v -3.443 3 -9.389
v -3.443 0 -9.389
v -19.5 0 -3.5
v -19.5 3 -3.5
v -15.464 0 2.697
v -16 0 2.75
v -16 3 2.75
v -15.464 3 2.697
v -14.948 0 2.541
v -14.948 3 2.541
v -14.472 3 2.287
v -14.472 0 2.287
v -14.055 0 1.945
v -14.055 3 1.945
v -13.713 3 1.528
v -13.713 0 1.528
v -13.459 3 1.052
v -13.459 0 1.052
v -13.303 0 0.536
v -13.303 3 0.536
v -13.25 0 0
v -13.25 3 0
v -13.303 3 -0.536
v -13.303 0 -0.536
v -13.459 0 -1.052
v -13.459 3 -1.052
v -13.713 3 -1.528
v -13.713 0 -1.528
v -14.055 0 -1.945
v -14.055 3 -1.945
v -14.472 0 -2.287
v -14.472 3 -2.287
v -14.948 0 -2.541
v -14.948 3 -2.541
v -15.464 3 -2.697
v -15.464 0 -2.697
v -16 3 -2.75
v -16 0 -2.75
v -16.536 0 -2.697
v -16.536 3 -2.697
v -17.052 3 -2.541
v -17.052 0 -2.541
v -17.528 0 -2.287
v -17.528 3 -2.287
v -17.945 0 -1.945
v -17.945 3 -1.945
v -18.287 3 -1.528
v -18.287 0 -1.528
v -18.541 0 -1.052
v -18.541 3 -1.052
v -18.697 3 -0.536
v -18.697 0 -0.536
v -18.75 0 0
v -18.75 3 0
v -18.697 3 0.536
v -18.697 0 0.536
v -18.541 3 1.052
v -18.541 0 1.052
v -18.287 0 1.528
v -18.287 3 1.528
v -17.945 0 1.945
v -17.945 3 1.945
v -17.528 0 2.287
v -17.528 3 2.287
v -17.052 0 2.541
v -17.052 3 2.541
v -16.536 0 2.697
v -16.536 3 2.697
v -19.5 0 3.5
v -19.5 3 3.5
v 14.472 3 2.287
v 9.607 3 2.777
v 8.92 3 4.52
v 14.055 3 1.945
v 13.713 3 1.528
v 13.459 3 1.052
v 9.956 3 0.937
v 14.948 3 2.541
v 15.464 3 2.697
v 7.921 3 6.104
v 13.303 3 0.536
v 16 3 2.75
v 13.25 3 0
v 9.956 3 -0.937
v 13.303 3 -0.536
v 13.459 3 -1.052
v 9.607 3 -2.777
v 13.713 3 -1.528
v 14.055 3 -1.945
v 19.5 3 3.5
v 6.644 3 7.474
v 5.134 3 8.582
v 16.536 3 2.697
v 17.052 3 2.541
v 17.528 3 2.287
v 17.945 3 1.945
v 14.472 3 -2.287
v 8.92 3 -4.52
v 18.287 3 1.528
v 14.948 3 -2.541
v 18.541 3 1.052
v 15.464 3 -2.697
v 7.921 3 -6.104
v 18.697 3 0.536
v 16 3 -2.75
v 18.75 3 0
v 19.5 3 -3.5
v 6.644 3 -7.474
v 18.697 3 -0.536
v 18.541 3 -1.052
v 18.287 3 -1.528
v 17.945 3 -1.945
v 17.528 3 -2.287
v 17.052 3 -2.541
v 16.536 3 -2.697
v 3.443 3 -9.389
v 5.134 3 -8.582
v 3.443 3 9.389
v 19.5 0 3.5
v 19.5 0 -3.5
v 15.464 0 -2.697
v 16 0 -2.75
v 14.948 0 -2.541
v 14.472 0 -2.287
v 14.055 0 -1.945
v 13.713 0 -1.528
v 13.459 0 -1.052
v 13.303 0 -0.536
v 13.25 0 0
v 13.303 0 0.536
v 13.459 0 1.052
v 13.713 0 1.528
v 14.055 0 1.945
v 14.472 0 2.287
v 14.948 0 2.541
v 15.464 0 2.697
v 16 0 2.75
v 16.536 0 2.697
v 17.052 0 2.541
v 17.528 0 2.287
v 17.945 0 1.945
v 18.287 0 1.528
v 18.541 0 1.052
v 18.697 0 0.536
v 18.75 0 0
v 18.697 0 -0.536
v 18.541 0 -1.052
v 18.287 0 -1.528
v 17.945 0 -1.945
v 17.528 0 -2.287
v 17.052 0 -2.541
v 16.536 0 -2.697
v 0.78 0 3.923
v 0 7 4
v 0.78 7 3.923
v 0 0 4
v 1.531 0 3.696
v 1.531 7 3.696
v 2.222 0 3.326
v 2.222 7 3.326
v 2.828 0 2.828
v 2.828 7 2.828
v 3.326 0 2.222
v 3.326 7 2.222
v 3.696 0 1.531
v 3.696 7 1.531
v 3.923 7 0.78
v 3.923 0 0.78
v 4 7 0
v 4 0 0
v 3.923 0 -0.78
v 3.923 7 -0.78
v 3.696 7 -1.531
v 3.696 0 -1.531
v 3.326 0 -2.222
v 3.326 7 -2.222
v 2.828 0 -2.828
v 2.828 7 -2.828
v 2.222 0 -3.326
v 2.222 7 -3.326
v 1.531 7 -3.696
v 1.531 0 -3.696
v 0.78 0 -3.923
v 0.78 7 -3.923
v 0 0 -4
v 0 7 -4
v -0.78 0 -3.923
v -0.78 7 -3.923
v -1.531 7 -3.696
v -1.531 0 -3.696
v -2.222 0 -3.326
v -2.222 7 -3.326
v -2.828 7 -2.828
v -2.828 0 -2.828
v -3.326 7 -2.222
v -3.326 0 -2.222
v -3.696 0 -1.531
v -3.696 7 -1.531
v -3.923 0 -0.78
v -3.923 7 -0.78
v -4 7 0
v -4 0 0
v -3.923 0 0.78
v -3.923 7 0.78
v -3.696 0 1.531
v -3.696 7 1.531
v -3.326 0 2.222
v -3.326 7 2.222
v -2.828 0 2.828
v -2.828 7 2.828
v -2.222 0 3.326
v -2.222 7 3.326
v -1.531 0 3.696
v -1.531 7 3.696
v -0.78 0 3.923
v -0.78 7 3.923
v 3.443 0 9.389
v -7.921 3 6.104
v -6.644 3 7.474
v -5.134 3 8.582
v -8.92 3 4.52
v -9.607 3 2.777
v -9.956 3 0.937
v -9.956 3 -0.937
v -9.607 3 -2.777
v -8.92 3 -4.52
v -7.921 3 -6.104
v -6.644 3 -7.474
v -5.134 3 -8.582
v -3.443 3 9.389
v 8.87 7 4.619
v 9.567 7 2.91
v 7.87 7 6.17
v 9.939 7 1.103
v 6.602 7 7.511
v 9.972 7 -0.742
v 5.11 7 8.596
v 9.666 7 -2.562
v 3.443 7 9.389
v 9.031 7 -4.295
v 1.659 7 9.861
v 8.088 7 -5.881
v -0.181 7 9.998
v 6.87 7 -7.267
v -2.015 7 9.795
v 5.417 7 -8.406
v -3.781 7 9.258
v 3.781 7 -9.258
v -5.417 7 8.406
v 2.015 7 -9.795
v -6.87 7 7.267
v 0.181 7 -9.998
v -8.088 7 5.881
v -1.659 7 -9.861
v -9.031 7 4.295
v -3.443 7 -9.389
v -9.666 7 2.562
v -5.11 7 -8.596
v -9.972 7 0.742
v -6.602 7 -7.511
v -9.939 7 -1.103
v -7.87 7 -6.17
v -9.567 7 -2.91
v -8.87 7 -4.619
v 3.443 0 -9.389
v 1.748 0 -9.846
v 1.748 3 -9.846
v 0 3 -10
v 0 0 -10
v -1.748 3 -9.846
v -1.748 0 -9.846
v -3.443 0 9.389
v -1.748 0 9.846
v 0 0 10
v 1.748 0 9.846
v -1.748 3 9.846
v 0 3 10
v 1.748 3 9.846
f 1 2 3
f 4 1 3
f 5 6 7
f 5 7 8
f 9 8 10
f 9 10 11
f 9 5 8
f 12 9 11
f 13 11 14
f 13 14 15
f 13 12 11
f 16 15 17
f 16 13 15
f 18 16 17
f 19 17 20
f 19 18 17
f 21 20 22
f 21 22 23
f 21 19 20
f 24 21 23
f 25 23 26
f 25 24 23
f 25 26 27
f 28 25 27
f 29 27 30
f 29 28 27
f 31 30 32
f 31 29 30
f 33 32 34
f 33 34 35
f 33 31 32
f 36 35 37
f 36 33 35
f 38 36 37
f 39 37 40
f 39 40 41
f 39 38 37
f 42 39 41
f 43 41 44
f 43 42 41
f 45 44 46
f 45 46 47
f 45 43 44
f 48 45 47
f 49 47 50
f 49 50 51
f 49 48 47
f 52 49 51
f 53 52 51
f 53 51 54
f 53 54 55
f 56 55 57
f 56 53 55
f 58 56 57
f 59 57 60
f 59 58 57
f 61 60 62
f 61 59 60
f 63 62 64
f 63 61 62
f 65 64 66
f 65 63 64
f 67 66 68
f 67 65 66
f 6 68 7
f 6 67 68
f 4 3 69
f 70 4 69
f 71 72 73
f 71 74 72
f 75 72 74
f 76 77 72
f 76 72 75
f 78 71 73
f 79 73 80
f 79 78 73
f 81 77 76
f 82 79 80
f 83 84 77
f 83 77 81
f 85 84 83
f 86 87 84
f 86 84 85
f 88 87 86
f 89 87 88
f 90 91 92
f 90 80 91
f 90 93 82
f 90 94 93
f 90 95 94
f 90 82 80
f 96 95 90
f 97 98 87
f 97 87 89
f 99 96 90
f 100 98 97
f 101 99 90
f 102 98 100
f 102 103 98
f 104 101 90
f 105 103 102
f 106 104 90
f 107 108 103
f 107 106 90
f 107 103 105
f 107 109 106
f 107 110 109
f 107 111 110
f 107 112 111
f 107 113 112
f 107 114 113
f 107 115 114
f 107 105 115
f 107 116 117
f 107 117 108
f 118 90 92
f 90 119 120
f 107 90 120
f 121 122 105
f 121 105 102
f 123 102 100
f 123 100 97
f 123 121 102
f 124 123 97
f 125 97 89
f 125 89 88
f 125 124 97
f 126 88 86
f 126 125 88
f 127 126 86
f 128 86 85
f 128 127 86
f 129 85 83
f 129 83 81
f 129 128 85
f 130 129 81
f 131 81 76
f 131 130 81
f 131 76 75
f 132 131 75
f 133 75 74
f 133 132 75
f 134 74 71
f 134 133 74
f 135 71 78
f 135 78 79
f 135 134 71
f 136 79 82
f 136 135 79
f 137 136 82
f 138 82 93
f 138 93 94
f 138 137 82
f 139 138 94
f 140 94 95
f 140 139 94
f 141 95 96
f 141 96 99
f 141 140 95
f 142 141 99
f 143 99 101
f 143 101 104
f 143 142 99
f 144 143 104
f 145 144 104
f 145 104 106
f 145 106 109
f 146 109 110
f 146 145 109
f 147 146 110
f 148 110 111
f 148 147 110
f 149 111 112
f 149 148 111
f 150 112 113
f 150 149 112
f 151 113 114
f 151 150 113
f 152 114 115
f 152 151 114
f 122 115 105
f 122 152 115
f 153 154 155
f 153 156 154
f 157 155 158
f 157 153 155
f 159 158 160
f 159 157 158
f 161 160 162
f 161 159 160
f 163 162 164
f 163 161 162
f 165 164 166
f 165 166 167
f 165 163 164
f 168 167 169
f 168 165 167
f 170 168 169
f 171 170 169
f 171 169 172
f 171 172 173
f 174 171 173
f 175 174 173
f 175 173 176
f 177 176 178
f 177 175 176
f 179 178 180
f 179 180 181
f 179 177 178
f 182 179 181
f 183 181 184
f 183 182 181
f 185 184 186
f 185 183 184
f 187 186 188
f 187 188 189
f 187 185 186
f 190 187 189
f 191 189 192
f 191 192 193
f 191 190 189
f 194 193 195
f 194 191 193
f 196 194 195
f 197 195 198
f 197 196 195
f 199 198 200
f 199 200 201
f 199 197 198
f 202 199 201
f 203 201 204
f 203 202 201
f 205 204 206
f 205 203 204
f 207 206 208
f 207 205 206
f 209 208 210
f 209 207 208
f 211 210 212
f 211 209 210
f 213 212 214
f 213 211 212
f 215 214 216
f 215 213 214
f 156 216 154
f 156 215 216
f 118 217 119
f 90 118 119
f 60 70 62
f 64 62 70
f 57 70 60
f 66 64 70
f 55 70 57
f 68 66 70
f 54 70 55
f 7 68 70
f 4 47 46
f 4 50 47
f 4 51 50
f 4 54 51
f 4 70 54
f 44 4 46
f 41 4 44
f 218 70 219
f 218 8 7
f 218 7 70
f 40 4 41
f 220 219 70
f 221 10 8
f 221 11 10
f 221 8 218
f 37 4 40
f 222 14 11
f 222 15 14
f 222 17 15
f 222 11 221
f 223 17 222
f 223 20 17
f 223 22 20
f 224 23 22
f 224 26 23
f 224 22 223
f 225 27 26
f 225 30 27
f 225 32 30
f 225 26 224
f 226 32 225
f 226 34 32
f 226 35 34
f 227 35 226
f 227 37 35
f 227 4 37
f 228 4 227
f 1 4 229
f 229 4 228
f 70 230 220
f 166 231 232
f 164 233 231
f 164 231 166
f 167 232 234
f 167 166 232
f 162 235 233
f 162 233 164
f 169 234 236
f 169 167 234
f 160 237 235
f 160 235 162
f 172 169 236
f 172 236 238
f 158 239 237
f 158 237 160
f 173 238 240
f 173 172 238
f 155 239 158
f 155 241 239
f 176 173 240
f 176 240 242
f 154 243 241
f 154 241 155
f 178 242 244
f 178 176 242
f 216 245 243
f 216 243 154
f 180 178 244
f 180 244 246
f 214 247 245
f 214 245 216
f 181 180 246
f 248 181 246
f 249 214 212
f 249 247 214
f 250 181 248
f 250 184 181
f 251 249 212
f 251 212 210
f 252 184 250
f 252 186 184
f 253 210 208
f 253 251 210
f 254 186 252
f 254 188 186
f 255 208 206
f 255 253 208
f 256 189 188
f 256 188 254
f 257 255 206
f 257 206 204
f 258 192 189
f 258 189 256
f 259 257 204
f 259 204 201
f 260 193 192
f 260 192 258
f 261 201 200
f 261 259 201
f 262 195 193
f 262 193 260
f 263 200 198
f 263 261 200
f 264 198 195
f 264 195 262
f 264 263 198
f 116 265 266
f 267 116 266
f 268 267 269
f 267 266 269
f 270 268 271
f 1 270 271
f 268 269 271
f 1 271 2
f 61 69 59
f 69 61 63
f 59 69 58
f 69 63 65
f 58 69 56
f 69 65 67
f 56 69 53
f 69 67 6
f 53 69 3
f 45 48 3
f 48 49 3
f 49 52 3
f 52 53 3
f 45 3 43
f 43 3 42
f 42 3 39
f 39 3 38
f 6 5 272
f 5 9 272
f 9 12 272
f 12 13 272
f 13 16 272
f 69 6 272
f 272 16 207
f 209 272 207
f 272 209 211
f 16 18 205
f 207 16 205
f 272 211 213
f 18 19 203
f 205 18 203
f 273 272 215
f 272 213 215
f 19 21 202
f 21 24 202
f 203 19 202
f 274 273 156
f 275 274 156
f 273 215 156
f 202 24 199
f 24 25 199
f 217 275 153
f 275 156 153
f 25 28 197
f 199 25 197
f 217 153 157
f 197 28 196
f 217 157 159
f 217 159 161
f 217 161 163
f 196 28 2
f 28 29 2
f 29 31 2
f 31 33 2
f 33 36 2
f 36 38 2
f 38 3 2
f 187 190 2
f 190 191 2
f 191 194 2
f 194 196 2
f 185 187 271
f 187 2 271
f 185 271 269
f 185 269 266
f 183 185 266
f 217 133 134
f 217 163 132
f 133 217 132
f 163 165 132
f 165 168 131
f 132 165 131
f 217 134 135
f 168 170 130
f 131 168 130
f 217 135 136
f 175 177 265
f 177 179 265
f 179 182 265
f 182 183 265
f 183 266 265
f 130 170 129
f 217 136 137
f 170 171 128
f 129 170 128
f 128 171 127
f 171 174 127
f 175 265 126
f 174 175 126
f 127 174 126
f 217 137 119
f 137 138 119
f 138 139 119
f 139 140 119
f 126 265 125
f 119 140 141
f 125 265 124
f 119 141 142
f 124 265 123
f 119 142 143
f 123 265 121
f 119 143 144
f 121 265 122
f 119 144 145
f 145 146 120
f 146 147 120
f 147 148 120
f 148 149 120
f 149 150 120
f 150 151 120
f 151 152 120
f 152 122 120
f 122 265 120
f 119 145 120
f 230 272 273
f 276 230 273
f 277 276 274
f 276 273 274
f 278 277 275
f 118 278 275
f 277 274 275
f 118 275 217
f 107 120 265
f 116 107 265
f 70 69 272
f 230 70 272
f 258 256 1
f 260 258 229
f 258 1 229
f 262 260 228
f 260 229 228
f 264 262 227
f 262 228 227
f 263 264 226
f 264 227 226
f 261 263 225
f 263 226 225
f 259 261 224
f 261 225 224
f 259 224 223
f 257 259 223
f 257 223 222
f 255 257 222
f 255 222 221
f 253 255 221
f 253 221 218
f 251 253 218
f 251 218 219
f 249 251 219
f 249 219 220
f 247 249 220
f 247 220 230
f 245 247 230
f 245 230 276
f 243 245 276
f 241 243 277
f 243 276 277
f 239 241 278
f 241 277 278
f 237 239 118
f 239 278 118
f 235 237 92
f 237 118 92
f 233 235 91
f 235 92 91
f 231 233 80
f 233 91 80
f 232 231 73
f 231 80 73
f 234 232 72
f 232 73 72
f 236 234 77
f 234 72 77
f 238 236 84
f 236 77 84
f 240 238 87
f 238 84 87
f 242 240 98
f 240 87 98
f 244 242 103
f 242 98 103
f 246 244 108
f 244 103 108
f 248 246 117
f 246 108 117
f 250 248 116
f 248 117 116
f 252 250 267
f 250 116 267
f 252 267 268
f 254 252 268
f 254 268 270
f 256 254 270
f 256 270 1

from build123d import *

# Parameters (mm, degrees)
SKETCH_1_R      = 2.75
SKETCH_1_R_2    = 4
EXTRUDE_1_DEPTH = 3
SKETCH_2_R      = 10
SKETCH_2_R_2    = 4
EXTRUDE_2_DEPTH = 4


with BuildPart() as part:
    # 草图1 → 凸台-拉伸1 (new body)
    with BuildSketch(Plane(origin=(0, 0, 0), x_dir=(1, 0, 0), z_dir=(0, 1, 0))):
        with BuildLine():
            Line((-19.5, 3.5), (-19.5, -3.5))
            Line((-19.5, -3.5), (-3.443077457, -9.388568455))
            ThreePointArc((-3.443077457, -9.388568455), (0, -10), (3.443077457, -9.388568455))
            Line((3.443077457, -9.388568455), (19.5, -3.5))
            Line((19.5, -3.5), (19.5, 3.5))
            Line((19.5, 3.5), (3.443077457, 9.388568455))
            ThreePointArc((3.443077457, 9.388568455), (0, 10), (-3.443077457, 9.388568455))
            Line((-3.443077457, 9.388568455), (-19.5, 3.5))
        make_face()
        with Locations(Location((-16, 0, 0), (0, 0, 270))):
            Circle(SKETCH_1_R, mode=Mode.SUBTRACT)
        with Locations(Location((0, 0, 0), (0, 0, 270))):
            Circle(SKETCH_1_R_2, mode=Mode.SUBTRACT)
        with Locations(Location((16, 0, 0), (0, 0, 90))):
            Circle(SKETCH_1_R, mode=Mode.SUBTRACT)
    extrude(amount=EXTRUDE_1_DEPTH)

    # 草图2 → 凸台-拉伸2 (add)
    with BuildSketch(Plane(origin=(0, 3, 0), x_dir=(1, 0, 0), z_dir=(0, 1, 0))):
        with Locations(Location((0, 0, 0), (0, 0, 110.139543726))):
            Circle(SKETCH_2_R)
        with Locations(Location((0, 0, 0), (0, 0, 270))):
            Circle(SKETCH_2_R_2, mode=Mode.SUBTRACT)
    extrude(amount=EXTRUDE_2_DEPTH)


solid = part.part
